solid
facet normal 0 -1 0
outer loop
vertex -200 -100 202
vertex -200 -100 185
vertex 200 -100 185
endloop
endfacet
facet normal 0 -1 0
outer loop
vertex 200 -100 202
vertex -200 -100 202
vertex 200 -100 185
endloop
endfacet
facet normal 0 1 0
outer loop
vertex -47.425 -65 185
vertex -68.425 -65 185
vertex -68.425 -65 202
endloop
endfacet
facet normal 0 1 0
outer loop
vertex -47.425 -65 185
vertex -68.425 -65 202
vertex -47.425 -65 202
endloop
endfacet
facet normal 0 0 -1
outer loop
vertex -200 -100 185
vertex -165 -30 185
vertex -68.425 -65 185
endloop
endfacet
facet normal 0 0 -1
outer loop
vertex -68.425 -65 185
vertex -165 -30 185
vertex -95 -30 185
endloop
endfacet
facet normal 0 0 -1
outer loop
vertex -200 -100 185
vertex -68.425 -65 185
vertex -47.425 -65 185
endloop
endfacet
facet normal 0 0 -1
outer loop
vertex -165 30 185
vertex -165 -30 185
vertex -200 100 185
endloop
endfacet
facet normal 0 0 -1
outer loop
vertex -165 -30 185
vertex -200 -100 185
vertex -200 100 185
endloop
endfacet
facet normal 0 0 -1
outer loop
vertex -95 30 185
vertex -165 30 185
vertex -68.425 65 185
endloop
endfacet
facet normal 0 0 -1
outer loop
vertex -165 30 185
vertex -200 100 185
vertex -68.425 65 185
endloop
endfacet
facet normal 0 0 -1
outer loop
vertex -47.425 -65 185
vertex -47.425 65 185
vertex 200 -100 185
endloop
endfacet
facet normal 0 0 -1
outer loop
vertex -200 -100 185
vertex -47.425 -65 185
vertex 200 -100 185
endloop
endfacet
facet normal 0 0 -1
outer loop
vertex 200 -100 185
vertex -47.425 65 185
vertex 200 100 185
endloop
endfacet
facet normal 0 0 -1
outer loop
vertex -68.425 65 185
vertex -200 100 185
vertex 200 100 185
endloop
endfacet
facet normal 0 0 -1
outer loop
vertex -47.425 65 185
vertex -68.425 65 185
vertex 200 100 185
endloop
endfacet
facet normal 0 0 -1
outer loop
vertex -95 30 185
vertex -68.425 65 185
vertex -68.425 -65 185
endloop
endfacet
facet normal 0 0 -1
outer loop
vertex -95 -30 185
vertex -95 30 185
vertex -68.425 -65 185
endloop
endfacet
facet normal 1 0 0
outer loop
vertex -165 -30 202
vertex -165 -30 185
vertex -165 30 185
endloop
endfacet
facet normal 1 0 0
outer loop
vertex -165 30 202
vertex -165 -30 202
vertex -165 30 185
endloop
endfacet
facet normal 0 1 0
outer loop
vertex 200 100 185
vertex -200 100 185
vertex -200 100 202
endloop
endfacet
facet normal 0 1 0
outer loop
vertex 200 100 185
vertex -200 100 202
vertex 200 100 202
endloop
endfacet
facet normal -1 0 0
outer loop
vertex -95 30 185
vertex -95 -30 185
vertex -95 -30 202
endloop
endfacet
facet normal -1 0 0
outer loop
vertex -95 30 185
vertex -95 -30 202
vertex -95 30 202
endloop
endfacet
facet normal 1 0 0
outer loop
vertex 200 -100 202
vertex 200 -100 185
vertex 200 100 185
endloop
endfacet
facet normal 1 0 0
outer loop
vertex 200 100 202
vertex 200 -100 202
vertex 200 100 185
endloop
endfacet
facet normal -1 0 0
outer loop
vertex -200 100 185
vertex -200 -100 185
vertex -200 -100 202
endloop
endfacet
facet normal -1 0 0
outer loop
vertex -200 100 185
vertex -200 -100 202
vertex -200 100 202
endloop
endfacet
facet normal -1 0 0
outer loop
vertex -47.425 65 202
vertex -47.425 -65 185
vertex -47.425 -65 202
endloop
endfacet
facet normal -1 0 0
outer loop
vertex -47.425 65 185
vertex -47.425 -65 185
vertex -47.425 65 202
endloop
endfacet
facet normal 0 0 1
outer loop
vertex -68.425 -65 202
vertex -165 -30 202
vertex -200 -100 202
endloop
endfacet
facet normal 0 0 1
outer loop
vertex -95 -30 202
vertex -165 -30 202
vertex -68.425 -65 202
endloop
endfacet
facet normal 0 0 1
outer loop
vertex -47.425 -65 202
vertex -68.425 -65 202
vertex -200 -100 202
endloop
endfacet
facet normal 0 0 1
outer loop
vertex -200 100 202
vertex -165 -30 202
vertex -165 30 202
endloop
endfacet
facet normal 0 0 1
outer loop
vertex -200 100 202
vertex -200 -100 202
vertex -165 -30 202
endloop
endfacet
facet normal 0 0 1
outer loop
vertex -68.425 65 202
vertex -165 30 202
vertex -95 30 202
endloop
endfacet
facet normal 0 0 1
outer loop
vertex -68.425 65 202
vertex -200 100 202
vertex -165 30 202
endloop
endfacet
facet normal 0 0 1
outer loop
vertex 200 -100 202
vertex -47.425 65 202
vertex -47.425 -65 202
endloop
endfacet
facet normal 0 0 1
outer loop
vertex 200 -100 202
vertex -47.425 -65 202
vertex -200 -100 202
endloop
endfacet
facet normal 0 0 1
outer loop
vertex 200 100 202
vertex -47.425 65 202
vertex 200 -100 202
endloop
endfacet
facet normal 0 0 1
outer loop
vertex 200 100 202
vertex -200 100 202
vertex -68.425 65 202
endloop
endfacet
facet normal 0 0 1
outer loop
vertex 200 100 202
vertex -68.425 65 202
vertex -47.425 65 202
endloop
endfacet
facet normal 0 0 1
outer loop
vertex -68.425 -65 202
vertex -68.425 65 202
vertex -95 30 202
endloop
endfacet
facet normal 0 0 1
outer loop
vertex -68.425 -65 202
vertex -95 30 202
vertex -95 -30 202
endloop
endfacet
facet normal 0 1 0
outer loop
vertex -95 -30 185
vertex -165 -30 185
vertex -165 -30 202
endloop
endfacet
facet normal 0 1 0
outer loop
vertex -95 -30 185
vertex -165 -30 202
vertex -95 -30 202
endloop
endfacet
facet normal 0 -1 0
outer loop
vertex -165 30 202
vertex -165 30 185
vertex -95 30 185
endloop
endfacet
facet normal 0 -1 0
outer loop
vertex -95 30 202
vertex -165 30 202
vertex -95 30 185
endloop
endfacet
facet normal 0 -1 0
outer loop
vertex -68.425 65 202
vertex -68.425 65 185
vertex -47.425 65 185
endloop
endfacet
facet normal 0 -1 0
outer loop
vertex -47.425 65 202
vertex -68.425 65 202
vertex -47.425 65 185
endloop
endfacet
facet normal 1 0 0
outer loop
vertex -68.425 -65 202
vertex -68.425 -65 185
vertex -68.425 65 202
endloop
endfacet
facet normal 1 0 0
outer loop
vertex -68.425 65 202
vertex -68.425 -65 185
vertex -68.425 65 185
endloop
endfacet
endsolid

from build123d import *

# Parameters (mm, degrees)
SKETCH002_W     = 400
SKETCH002_H     = 200
PAD001_DEPTH    = 17
SKETCH001_W     = 70
SKETCH001_H     = 60
POCKET_DEPTH    = 17
SKETCH011_W     = 21
SKETCH011_H     = 130
POCKET003_DEPTH = 17.001


with BuildPart() as part:
    # Sketch002 → Pad001 (new body)
    with BuildSketch(Plane.XY):
        Rectangle(SKETCH002_W, SKETCH002_H)
    extrude(amount=PAD001_DEPTH)

    # Sketch001 → Pocket (cut)
    with BuildSketch(Plane.XY):
        with Locations((-130, 0)):
            Rectangle(SKETCH001_W, SKETCH001_H)
    extrude(amount=POCKET_DEPTH, mode=Mode.SUBTRACT)

    # Sketch011 → Pocket003 (cut, through all)
    with BuildSketch(Plane.XY):
        with Locations((-57.925, 0)):
            Rectangle(SKETCH011_W, SKETCH011_H)
    extrude(amount=POCKET003_DEPTH, mode=Mode.SUBTRACT)


with BuildPart() as part_1:
    # Body placement: moved
    add(part.part.moved(Location((0, 0, 185))))


solid = part_1.part
